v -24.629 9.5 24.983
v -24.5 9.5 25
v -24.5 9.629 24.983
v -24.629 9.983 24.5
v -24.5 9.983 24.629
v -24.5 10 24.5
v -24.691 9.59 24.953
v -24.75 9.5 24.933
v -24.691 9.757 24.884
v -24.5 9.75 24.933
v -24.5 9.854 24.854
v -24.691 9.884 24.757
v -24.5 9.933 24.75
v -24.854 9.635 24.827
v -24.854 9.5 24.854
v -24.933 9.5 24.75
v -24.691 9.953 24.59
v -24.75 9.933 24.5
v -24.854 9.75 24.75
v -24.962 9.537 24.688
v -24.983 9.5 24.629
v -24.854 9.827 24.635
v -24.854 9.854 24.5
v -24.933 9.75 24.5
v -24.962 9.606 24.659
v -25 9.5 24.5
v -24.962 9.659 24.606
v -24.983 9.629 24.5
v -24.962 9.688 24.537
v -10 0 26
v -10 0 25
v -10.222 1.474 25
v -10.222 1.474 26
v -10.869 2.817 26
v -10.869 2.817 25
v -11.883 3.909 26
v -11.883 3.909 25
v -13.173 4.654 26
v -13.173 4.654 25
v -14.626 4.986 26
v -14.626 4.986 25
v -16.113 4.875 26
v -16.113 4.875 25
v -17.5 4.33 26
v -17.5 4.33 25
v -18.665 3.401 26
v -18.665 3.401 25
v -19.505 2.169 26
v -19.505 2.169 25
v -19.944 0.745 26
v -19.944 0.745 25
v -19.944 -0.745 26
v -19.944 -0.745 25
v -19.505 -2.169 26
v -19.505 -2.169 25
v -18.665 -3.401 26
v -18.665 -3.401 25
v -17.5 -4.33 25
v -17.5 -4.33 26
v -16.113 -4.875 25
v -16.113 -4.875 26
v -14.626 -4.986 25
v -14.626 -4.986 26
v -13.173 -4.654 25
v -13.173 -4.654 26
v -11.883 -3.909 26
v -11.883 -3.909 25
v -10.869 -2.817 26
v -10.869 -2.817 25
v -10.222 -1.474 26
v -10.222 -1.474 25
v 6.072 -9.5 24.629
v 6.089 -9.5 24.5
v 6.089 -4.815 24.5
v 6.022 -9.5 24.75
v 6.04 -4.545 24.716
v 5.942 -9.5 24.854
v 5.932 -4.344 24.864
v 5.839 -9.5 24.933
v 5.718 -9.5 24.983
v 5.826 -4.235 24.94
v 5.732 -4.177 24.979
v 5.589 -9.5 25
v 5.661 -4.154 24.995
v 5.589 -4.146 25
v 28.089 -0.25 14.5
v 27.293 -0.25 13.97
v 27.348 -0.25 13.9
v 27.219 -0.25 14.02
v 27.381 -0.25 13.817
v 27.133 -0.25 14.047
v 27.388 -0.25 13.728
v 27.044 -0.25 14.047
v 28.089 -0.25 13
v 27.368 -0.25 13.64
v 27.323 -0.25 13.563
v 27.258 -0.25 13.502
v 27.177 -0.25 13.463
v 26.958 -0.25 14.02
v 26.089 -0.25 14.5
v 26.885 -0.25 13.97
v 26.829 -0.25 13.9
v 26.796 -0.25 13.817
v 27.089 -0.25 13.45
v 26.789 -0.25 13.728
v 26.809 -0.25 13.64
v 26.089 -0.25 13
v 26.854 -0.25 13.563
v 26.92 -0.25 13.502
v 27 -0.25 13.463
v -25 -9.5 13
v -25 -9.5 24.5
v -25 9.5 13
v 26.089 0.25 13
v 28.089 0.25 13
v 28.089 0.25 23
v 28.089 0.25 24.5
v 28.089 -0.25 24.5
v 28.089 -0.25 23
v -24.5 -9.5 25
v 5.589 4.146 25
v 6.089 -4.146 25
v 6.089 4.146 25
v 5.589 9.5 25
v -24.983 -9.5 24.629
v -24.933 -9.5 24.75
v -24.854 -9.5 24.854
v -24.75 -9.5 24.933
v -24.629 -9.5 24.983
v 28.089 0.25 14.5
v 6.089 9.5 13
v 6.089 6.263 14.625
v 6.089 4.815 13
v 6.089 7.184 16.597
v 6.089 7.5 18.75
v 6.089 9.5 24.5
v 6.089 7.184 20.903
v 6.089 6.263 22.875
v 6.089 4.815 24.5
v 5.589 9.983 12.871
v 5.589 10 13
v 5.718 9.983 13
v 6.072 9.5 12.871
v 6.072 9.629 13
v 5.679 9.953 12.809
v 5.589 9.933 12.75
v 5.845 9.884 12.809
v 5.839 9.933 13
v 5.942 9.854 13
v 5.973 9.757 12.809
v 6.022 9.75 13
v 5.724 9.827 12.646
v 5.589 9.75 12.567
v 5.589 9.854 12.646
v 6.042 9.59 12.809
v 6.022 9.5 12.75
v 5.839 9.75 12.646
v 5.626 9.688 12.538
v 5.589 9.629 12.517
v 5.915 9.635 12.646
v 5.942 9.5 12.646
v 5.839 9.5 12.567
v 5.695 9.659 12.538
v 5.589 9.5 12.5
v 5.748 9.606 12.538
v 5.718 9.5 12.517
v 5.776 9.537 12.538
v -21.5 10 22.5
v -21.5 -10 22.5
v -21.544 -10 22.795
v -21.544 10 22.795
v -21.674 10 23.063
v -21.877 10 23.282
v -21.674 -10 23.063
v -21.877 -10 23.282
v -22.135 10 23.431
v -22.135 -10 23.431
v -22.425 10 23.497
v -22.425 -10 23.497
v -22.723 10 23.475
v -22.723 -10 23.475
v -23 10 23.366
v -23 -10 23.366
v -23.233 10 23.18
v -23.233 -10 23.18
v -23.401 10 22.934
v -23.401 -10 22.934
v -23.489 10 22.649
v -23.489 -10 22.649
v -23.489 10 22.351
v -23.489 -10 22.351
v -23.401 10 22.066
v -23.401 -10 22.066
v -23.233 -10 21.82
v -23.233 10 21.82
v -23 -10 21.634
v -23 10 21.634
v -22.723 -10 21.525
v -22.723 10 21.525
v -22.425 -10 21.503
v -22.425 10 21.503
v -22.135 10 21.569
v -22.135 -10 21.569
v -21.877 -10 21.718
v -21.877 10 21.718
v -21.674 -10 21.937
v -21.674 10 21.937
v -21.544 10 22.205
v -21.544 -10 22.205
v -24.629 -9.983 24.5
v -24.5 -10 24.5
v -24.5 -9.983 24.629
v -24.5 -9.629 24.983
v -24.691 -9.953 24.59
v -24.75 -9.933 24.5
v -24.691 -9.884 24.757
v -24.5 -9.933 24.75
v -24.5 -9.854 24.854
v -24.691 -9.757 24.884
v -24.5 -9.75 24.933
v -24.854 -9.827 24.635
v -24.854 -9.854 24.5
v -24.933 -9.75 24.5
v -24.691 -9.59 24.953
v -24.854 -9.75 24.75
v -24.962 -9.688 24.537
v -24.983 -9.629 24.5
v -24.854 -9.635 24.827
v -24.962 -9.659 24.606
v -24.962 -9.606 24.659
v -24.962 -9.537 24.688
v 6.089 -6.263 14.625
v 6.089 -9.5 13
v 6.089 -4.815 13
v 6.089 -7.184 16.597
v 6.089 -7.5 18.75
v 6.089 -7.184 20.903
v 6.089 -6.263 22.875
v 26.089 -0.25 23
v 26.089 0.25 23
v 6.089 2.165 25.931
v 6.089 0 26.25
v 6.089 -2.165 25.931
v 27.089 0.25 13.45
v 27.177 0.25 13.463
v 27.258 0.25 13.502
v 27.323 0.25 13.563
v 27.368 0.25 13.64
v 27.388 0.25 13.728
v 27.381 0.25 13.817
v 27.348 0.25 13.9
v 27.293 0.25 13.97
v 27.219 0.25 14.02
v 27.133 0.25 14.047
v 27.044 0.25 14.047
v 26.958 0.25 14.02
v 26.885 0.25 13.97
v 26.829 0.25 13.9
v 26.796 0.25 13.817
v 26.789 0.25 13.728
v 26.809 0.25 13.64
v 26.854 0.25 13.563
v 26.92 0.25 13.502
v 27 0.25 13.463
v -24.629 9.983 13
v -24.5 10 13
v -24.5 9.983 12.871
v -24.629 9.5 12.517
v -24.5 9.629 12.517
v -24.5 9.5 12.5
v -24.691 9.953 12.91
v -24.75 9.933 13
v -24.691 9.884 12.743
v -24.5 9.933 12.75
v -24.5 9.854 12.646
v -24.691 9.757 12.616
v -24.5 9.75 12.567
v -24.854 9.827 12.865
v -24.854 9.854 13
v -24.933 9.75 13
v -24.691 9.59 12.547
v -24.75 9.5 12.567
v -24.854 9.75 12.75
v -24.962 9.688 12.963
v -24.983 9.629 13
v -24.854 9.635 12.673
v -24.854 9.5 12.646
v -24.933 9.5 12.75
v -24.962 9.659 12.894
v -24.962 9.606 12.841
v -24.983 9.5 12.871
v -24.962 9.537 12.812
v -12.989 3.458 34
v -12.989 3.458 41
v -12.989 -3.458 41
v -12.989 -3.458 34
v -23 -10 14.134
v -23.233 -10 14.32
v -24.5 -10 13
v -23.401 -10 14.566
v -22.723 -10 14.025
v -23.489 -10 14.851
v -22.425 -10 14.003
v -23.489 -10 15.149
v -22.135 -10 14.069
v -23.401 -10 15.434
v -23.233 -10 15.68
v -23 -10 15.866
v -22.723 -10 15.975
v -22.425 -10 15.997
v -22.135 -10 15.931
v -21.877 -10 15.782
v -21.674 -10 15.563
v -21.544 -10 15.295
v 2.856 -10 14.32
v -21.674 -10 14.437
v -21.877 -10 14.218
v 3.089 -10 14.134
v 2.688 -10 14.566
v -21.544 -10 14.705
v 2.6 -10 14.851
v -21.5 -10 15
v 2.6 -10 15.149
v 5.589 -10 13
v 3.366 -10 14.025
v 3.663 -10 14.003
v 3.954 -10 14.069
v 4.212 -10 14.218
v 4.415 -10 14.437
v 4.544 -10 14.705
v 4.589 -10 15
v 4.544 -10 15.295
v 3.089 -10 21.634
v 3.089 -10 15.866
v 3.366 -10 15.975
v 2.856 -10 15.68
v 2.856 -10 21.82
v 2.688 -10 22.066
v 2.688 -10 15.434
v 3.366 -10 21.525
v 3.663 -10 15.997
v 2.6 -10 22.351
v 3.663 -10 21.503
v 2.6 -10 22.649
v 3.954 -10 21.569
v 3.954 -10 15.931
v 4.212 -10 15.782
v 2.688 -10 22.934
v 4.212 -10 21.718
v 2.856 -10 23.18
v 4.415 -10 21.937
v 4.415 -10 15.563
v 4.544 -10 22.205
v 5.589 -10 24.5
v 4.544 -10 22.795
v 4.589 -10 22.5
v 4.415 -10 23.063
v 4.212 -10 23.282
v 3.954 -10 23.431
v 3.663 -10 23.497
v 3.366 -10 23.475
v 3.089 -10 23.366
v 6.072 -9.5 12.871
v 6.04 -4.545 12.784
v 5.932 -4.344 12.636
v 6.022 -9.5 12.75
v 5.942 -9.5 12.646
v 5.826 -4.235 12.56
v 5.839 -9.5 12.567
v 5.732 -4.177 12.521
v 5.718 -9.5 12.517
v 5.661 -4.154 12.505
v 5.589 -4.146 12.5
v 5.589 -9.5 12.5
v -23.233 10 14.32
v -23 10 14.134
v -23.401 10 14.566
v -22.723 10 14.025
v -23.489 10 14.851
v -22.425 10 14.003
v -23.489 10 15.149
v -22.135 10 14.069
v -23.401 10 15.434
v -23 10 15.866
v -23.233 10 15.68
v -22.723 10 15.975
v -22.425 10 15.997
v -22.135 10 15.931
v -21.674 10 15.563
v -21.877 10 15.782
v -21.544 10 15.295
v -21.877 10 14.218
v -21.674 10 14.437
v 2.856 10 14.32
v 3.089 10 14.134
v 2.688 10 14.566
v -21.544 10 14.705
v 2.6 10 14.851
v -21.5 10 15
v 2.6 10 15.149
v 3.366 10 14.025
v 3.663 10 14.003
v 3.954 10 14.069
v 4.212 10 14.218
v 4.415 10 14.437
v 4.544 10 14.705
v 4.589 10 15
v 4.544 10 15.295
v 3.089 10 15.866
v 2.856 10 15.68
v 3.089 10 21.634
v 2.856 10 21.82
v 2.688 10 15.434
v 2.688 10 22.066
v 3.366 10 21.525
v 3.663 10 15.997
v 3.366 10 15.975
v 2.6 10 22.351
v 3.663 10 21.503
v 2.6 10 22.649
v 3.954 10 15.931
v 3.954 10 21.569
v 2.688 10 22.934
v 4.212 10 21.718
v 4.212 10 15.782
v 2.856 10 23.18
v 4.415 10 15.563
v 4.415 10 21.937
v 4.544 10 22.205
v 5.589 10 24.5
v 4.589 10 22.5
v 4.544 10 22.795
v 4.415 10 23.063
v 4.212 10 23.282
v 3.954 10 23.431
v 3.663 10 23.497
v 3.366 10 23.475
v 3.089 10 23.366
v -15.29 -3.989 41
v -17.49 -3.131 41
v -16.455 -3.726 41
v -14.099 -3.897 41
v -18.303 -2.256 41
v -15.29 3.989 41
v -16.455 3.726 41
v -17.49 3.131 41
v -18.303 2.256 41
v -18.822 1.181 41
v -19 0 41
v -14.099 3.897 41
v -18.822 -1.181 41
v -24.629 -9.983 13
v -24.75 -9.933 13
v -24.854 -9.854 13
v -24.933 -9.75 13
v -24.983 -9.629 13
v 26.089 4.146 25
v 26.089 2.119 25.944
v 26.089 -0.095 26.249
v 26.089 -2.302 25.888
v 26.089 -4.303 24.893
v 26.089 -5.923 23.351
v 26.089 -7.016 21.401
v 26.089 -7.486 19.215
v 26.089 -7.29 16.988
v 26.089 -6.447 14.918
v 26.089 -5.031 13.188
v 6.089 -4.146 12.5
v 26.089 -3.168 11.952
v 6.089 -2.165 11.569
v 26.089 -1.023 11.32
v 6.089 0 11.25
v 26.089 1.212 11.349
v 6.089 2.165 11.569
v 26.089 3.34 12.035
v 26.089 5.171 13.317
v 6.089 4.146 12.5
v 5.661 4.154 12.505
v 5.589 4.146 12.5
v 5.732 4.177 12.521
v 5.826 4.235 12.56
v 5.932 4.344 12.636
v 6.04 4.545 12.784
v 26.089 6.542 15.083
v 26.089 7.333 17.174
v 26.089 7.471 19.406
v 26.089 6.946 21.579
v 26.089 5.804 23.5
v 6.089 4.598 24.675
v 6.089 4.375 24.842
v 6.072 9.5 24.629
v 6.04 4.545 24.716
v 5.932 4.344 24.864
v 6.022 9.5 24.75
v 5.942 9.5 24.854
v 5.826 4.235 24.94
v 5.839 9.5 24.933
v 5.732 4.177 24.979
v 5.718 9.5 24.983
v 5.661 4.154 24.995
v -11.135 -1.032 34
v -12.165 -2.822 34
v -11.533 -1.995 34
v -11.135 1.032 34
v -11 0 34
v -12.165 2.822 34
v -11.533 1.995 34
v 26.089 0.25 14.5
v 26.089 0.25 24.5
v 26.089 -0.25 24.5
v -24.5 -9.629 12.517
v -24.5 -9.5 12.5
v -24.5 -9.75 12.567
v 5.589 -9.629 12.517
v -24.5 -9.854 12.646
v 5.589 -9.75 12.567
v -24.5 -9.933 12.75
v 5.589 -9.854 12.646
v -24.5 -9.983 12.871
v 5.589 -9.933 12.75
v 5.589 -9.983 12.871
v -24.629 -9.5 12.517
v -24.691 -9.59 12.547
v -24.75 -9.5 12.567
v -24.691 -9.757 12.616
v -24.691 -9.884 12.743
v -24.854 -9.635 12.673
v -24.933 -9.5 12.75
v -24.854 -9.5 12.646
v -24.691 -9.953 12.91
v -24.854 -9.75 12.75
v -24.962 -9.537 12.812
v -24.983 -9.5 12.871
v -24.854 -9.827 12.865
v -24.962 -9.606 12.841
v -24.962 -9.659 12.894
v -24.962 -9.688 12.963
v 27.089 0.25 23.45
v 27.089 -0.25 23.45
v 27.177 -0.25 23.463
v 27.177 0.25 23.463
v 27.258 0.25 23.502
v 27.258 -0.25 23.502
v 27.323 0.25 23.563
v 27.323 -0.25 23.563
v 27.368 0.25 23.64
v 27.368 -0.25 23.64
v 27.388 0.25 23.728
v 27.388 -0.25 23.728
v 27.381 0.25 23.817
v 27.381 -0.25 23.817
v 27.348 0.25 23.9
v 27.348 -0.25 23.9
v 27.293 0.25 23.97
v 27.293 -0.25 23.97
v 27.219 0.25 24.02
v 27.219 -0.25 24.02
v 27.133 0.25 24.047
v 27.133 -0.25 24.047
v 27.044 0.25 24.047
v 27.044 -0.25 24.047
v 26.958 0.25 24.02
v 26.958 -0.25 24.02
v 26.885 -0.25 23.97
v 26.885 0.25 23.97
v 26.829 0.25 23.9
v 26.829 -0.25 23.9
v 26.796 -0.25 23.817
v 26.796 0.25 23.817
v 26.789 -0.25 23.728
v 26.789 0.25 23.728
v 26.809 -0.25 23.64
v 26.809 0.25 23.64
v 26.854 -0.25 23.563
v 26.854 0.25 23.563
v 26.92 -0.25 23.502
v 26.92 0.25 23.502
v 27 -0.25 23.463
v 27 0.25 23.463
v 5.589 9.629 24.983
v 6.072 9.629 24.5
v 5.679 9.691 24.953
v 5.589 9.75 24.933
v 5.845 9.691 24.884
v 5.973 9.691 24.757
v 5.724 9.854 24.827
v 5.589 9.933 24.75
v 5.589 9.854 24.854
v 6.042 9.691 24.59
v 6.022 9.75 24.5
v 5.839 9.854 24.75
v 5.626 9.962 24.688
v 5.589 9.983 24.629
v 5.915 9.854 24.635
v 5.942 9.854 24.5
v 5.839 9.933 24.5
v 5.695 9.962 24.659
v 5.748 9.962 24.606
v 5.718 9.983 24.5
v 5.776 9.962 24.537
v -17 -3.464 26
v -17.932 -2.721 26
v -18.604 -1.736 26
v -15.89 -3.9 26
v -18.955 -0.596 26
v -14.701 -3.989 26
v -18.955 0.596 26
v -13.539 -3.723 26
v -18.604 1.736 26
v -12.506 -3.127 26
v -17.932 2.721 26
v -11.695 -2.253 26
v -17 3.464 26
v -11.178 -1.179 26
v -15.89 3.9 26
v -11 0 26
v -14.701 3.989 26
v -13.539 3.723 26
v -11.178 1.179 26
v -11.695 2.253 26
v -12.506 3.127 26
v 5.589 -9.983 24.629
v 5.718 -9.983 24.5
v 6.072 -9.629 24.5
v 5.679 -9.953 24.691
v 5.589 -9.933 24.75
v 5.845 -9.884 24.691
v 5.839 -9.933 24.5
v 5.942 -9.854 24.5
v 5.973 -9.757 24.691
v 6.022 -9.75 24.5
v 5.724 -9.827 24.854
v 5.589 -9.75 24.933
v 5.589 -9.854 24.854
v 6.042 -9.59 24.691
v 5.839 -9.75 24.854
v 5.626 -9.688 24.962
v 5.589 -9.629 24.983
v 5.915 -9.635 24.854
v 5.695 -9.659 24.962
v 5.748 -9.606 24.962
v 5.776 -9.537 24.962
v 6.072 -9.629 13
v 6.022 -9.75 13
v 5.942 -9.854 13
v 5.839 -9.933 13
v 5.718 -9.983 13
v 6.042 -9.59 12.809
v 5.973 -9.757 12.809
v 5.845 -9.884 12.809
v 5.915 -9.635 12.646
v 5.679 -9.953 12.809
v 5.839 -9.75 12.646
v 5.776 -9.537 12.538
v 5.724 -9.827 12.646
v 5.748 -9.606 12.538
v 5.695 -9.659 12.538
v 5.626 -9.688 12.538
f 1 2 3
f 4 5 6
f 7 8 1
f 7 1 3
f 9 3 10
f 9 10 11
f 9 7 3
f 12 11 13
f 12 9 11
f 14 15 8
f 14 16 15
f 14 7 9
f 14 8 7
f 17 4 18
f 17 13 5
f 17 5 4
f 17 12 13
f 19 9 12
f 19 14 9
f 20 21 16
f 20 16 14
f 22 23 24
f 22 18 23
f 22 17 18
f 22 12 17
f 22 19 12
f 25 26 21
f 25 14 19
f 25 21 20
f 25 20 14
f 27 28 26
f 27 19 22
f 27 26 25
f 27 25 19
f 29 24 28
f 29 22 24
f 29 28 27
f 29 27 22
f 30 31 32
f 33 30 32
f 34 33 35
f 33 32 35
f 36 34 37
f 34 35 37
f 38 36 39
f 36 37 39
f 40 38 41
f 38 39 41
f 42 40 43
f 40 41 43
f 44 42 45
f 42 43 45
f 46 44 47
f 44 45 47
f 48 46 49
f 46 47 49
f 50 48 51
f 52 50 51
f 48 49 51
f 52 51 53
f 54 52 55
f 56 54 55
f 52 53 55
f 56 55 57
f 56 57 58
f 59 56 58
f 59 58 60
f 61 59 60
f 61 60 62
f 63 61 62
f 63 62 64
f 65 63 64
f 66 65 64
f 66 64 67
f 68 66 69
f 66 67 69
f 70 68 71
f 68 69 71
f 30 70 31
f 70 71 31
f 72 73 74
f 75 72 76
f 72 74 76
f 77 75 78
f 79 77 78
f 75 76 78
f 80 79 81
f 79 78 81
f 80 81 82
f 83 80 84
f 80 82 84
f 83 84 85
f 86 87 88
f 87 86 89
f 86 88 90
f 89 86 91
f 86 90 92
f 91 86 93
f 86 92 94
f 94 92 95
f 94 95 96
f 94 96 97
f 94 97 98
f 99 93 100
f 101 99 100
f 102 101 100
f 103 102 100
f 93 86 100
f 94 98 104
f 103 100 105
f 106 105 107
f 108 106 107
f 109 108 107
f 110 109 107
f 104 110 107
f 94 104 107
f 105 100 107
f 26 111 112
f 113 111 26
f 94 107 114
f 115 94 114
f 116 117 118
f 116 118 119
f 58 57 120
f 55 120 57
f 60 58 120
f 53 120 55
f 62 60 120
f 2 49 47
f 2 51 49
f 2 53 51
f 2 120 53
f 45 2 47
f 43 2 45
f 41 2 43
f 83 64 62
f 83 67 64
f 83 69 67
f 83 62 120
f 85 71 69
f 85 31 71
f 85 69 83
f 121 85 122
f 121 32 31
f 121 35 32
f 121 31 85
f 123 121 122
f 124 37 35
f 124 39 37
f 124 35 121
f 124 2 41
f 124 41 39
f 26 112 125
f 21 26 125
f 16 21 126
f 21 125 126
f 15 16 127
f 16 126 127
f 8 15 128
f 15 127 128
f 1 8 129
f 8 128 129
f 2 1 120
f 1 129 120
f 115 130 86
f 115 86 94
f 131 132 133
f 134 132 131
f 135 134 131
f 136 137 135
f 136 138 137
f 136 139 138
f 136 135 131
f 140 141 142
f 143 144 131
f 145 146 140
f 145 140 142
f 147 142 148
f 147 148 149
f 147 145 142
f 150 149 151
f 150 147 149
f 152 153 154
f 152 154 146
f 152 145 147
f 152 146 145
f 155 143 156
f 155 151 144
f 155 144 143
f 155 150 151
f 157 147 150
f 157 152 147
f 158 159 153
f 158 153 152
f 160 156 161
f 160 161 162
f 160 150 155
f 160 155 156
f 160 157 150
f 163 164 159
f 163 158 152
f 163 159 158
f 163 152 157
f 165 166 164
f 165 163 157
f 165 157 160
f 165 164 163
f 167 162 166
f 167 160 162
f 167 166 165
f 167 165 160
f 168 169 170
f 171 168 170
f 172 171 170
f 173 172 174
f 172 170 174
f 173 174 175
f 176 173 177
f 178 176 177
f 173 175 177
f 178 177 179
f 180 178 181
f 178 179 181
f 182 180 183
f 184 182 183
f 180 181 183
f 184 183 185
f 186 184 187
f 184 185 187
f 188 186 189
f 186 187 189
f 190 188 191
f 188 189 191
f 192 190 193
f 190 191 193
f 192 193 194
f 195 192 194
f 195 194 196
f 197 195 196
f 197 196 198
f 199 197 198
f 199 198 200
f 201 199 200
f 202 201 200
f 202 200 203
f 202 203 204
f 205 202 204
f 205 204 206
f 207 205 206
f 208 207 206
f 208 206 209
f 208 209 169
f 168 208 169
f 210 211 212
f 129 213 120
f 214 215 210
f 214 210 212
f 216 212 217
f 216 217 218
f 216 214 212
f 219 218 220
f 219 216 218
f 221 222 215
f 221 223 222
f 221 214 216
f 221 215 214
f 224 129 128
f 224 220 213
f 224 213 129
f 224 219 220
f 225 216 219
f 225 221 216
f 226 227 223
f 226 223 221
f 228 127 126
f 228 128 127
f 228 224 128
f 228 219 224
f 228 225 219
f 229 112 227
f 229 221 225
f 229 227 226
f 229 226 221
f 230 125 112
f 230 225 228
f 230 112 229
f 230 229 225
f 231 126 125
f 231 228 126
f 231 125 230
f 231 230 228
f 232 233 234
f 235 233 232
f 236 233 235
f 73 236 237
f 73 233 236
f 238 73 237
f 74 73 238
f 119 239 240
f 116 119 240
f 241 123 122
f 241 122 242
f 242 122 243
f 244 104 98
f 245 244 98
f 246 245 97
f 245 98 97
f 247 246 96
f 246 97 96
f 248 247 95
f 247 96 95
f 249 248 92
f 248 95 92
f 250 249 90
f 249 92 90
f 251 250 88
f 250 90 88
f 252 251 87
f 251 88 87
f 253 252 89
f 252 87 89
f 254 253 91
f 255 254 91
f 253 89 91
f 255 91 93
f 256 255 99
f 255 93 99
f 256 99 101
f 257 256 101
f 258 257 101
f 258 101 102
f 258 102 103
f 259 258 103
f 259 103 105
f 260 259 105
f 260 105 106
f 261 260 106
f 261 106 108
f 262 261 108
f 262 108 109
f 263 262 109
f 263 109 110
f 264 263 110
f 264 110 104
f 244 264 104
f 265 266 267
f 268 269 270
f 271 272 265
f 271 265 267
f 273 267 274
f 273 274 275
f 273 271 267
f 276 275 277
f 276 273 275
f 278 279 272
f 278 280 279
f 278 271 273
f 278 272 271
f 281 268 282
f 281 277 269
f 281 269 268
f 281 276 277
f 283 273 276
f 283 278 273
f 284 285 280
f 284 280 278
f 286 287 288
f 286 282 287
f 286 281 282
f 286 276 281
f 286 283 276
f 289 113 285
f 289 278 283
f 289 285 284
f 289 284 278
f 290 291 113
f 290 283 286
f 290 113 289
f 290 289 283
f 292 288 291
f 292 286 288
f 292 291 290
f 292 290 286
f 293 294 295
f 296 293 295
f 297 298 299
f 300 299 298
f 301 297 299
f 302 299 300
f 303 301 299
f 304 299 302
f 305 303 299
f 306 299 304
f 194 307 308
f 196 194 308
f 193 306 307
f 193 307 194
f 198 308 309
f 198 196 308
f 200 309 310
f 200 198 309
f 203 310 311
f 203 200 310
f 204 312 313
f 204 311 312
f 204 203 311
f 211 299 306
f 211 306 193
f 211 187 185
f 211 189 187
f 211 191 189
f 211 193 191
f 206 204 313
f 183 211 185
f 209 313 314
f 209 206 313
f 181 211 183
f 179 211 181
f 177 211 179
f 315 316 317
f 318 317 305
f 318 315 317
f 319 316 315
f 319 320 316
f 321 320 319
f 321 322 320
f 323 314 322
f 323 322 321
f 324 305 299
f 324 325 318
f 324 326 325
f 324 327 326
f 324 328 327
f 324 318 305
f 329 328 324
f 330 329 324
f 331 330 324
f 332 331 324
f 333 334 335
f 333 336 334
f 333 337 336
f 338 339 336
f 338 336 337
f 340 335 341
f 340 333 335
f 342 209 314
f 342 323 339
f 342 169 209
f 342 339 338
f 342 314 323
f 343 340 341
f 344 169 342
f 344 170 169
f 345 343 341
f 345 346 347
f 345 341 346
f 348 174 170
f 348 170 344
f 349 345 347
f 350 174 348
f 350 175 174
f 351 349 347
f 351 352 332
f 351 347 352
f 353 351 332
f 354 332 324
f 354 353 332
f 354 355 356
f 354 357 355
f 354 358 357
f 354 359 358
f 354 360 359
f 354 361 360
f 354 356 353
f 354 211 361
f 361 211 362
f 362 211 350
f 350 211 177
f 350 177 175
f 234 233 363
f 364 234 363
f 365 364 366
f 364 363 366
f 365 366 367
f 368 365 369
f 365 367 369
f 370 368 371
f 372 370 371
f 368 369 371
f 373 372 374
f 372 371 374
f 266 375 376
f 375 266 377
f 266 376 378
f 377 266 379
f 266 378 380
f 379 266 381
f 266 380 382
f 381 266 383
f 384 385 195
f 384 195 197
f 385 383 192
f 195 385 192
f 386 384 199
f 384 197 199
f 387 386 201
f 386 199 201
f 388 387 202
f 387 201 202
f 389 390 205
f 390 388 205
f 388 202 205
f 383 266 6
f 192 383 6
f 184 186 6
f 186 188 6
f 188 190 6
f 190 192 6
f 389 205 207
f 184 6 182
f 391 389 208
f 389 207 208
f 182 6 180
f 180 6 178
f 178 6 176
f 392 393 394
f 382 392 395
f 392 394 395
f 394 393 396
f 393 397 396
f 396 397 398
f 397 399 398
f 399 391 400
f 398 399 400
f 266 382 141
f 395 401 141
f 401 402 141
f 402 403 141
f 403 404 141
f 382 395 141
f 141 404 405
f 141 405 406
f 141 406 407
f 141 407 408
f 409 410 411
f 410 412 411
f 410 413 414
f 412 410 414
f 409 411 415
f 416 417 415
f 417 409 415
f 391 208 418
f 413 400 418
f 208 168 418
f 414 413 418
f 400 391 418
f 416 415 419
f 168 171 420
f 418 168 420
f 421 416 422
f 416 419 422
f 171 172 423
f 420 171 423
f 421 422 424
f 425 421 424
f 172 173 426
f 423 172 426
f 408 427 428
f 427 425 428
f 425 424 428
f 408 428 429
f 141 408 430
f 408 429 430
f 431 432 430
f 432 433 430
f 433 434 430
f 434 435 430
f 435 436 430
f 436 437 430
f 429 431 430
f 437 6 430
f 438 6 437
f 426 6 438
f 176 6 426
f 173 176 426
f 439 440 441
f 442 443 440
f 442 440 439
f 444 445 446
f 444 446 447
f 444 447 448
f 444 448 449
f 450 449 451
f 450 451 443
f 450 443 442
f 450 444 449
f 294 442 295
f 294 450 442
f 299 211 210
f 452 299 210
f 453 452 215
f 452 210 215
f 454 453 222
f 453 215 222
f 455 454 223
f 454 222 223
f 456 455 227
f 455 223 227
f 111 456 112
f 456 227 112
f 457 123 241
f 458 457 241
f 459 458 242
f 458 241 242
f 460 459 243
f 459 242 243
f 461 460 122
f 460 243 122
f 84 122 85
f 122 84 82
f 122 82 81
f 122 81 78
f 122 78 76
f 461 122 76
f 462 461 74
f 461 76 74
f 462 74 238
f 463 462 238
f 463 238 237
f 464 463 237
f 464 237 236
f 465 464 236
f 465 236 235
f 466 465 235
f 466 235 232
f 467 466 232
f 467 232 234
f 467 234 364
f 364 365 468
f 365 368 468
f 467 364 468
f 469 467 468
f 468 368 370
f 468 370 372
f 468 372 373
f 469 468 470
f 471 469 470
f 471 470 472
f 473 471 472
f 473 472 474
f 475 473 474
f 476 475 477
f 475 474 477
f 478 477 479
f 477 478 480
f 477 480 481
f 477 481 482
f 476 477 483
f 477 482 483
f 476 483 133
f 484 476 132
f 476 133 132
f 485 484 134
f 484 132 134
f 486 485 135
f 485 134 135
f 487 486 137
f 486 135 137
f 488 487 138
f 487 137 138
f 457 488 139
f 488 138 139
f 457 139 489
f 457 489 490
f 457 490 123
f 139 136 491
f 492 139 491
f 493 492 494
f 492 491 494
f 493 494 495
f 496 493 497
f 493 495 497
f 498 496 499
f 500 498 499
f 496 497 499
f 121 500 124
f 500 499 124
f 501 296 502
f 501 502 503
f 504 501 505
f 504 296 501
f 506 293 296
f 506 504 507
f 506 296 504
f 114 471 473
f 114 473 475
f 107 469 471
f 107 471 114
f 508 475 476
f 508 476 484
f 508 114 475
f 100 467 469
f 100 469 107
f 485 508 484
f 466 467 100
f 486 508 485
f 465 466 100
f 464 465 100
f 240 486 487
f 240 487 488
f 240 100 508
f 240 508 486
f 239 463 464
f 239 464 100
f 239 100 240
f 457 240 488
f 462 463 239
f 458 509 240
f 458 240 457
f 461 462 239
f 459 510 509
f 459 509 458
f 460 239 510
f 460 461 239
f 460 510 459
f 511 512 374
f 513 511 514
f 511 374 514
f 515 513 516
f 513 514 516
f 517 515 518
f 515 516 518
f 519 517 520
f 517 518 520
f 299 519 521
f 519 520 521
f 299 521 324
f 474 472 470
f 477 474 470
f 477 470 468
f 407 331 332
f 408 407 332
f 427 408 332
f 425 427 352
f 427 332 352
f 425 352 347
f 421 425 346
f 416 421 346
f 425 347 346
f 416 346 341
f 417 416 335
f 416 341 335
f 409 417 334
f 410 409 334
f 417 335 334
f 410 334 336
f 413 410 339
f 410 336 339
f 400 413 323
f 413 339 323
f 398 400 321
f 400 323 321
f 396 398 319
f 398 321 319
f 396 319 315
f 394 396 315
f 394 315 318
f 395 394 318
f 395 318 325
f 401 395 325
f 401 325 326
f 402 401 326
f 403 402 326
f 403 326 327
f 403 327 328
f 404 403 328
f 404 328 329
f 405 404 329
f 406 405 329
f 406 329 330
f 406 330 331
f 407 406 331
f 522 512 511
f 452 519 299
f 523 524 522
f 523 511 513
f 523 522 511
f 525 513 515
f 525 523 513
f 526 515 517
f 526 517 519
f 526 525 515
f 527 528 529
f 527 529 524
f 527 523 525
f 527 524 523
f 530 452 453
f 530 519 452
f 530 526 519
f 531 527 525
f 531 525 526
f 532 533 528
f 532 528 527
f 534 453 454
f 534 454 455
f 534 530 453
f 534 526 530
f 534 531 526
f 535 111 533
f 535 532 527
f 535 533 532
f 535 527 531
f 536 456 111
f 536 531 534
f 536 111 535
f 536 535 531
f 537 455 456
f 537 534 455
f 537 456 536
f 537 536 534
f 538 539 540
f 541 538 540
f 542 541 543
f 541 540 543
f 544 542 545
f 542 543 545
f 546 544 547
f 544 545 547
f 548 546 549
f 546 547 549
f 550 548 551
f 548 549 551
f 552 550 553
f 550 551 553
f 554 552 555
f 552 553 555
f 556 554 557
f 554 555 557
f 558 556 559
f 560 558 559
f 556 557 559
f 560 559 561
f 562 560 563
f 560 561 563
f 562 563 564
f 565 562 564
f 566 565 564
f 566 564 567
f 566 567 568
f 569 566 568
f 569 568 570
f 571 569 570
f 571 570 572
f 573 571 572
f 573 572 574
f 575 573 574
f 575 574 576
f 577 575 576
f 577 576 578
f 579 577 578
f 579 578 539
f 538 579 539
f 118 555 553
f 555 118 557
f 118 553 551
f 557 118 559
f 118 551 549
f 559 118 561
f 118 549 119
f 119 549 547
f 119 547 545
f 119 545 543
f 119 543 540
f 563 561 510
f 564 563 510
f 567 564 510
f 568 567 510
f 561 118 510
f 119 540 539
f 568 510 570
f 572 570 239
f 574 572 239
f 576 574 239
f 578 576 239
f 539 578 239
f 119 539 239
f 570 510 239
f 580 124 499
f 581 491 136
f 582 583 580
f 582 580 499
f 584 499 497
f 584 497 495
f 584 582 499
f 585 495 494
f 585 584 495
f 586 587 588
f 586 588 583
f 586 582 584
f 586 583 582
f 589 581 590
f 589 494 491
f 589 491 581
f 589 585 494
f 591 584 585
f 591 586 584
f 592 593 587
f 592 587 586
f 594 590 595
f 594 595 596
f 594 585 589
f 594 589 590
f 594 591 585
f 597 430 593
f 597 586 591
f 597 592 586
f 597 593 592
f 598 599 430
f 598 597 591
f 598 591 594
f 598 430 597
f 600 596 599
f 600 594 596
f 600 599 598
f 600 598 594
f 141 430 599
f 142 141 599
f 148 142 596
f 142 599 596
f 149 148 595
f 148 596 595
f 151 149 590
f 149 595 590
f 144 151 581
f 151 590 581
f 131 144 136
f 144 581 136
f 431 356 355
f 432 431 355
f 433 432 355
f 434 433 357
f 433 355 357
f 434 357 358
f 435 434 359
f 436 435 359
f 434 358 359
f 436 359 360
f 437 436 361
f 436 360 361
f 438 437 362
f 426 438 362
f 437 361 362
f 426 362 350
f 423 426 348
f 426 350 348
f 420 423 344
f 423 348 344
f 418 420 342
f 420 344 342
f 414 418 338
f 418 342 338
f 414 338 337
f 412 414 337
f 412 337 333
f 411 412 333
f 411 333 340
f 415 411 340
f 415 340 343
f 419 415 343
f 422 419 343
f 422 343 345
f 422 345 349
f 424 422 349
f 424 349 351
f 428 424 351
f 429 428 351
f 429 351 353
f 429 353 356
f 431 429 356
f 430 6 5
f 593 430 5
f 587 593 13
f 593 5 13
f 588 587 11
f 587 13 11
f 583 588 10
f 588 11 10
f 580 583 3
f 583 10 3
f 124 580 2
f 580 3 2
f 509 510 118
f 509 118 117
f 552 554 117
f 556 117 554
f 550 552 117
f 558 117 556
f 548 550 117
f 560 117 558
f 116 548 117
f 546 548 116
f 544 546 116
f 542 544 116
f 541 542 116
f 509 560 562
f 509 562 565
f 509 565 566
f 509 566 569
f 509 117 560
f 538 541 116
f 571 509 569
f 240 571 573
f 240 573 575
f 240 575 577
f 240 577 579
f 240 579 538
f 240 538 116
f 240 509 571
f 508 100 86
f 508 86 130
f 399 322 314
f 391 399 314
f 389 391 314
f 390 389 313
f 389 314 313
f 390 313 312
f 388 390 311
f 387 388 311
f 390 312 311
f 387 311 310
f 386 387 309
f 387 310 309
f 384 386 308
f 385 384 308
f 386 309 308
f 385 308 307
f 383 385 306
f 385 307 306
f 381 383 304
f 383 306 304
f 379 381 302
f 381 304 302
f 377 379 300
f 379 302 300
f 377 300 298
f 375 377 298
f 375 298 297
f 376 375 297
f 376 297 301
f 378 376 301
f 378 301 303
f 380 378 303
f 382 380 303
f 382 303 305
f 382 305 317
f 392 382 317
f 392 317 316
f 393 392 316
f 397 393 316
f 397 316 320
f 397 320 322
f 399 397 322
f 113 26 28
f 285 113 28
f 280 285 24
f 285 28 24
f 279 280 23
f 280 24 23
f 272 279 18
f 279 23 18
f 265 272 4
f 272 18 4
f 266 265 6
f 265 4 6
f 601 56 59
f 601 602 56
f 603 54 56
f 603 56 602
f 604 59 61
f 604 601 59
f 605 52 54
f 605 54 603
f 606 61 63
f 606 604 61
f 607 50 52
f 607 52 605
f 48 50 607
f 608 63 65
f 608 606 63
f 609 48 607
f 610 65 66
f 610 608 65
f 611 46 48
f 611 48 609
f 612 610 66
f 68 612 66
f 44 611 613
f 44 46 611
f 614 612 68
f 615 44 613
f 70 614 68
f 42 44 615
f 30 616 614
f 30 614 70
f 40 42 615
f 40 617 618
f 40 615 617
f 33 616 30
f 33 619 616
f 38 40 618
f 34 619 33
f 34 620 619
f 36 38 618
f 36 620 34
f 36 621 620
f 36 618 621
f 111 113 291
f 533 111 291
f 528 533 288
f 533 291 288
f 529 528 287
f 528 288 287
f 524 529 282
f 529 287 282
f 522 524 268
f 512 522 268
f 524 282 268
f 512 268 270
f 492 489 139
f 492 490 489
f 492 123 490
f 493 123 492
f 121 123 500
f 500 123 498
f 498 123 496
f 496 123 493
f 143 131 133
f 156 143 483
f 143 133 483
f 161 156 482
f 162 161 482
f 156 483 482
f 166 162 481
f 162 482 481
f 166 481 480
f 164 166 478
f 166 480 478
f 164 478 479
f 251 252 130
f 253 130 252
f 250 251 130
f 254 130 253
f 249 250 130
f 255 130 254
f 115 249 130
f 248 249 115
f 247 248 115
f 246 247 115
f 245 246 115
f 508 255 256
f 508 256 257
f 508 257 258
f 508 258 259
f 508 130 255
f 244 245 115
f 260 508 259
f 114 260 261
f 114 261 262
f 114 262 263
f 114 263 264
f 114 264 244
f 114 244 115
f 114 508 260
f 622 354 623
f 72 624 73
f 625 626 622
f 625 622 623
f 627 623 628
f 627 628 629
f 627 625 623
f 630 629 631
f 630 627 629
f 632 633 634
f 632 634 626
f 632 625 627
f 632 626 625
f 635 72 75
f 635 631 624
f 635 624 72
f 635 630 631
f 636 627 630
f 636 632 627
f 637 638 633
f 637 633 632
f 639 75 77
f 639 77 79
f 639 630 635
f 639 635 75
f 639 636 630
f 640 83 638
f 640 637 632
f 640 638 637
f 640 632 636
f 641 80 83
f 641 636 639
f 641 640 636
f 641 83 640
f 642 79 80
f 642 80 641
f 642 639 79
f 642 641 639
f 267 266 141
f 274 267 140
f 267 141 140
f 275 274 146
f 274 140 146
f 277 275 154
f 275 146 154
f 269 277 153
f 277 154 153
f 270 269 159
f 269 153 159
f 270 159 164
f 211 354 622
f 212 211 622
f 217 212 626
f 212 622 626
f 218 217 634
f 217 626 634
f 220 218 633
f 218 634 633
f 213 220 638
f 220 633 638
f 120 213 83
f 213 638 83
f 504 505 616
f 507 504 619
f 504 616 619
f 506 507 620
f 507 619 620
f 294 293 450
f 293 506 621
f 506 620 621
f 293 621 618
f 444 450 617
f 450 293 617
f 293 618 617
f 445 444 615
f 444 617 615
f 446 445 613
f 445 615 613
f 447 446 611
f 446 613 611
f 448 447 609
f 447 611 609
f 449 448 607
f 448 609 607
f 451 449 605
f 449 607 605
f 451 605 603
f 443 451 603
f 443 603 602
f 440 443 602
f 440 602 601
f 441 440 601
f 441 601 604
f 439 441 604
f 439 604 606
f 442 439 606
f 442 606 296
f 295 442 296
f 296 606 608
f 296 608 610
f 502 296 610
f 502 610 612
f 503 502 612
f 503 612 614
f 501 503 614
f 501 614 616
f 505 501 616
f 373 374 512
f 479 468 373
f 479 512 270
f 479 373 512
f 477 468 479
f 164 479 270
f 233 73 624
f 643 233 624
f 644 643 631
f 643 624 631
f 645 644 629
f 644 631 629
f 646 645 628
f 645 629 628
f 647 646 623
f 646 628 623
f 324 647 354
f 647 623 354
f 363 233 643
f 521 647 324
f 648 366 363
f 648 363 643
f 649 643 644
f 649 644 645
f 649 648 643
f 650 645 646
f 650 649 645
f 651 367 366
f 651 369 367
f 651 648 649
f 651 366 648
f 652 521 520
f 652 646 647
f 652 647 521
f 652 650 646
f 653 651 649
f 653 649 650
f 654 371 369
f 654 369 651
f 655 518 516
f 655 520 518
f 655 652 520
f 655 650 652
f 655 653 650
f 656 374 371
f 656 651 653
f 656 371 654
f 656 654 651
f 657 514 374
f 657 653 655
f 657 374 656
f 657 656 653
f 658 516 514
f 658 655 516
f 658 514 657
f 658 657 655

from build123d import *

# Parameters (mm, degrees)
SKETCH_1_W          = 50
SKETCH_1_H          = 30
EXTRUDE_1_DEPTH     = 25
SKETCH_2_R          = 5
EXTRUDE_2_DEPTH     = 1
SKETCH_3_R          = 4
EXTRUDE_3_DEPTH     = 15
SKETCH_6_W          = 125.650571392
SKETCH_6_H          = 76.942116616
SKETCH_6_W_2        = 31.088556847
SKETCH_6_H_2        = 20
CUT_EXTRUDE_1_DEPTH = 39.405728739
SKETCH_7_W          = 12.5
SKETCH_7_H          = 20
CUT_EXTRUDE_2_DEPTH = 53.416584845
SKETCH_8_R          = 7.5
EXTRUDE_5_DEPTH     = 20
SKETCH_9_W          = 1.5
SKETCH_9_H          = 0.5
EXTRUDE_6_DEPTH     = 2
SKETCH_10_R         = 0.3
CUT_EXTRUDE_3_DEPTH = 2
FILLET_1_R          = 0.5
CUT_EXTRUDE_START   = -7
CUT_EXTRUDE_4_DEPTH = 7
SKETCH_12_R         = 1
CUT_EXTRUDE_5_DEPTH = 54.572073189


with BuildPart() as part:
    # 草图1 → 凸台-拉伸1 (new body)
    with BuildSketch(Plane.XY):
        Rectangle(SKETCH_1_W, SKETCH_1_H)
    extrude(amount=EXTRUDE_1_DEPTH)

    # 草图2 → 凸台-拉伸2 (add)
    with BuildSketch(Plane.XY.offset(25)):
        with Locations((-15, 0)):
            Circle(SKETCH_2_R)
    extrude(amount=EXTRUDE_2_DEPTH)

    # 草图3 → 凸台-拉伸3 (add)
    with BuildSketch(Plane.XY.offset(26)):
        with Locations((-15, 0)):
            Circle(SKETCH_3_R)
    extrude(amount=EXTRUDE_3_DEPTH)

    # 草图6 → 切除-拉伸1 (cut, through all)
    with BuildSketch(Plane.XY.offset(25)):
        with Locations((-32.975192835, 18.238730024)):
            Rectangle(SKETCH_6_W, SKETCH_6_H)
        with Locations((-9.455721577, 0)):
            Rectangle(SKETCH_6_W_2, SKETCH_6_H_2, mode=Mode.SUBTRACT)
    extrude(amount=-CUT_EXTRUDE_1_DEPTH, mode=Mode.SUBTRACT)

    # 草图7 → 切除-拉伸2 (cut, through all)
    with BuildSketch(Plane(origin=(6.088556847, 0, 0), x_dir=(0, 0, -1), z_dir=(1, 0, 0))):
        with Locations((-6.25, 0)):
            Rectangle(SKETCH_7_W, SKETCH_7_H)
    extrude(amount=-CUT_EXTRUDE_2_DEPTH, mode=Mode.SUBTRACT)

    # 草图8 → 凸台-拉伸5 (add)
    with BuildSketch(Plane(origin=(6.088556847, 0, 0), x_dir=(0, 0, -1), z_dir=(1, 0, 0))):
        with Locations(Location((-18.75, 0, 0), (0, 0, 146.442690238))):
            Circle(SKETCH_8_R)
    extrude(amount=EXTRUDE_5_DEPTH)

    # 草图9 → 凸台-拉伸6 (add)
    with BuildSketch(Plane(origin=(26.088556847, 0, 0), x_dir=(0, 0, -1), z_dir=(1, 0, 0))):
        with Locations((-23.75, 0)):
            Rectangle(SKETCH_9_W, SKETCH_9_H)
        with Locations((-13.75, 0)):
            Rectangle(SKETCH_9_W, SKETCH_9_H)
    extrude(amount=EXTRUDE_6_DEPTH)

    # 草图10 → 切除-拉伸3 (cut)
    with BuildSketch(Plane.XZ.offset(0.25)):
        with Locations(Location((27.088556847, 23.75, 0), (0, 0, 270))):
            Circle(SKETCH_10_R)
        with Locations(Location((27.088556847, 13.75, 0), (0, 0, 270))):
            Circle(SKETCH_10_R)
    extrude(amount=-CUT_EXTRUDE_3_DEPTH, mode=Mode.SUBTRACT)

    # 圆角1
    # the kernel refuses this fillet: 0.5 mm, written as the material it takes off along each edge
    with BuildSketch(Plane(origin=(-24.5, -9.5, 24.5), x_dir=(0, 0, 1), z_dir=(-1, 0, 0))) as fillet_1_piece_1_section:
        Polygon((0, 0), (FILLET_1_R * 1.02, 0), (FILLET_1_R * 1.02, -FILLET_1_R * 1.02), (0, -FILLET_1_R * 1.02), align=None)
    fillet_1_piece_1 = extrude(amount=FILLET_1_R * 1.02, mode=Mode.PRIVATE)
    fillet_1_piece_1 = fillet_1_piece_1 - Plane(origin=(-24.5, -9.5, 24.5), x_dir=(0, 0.7071067811865475, -0.7071067811865475), z_dir=(-1, 0, 0)) * Sphere(FILLET_1_R, mode=Mode.PRIVATE)
    add(fillet_1_piece_1, mode=Mode.SUBTRACT)
    with BuildSketch(Plane(origin=(-24.5, 9.5, 24.5), x_dir=(0, 1, 0), z_dir=(-1, 0, 0))) as fillet_1_piece_2_section:
        Polygon((0, 0), (FILLET_1_R * 1.02, 0), (FILLET_1_R * 1.02, -FILLET_1_R * 1.02), (0, -FILLET_1_R * 1.02), align=None)
    fillet_1_piece_2 = extrude(amount=FILLET_1_R * 1.02, mode=Mode.PRIVATE)
    fillet_1_piece_2 = fillet_1_piece_2 - Plane(origin=(-24.5, 9.5, 24.5), x_dir=(0, -0.7071067811865475, -0.7071067811865475), z_dir=(-1, 0, 0)) * Sphere(FILLET_1_R, mode=Mode.PRIVATE)
    add(fillet_1_piece_2, mode=Mode.SUBTRACT)
    with BuildSketch(Plane(origin=(5.588556847, 9.5, 24.5), x_dir=(0, 0, 1), z_dir=(0, 1, 0))) as fillet_1_piece_3_section:
        Polygon((0, 0), (FILLET_1_R * 1.02, 0), (FILLET_1_R * 1.02, FILLET_1_R * 1.02), (0, FILLET_1_R * 1.02), align=None)
    fillet_1_piece_3 = extrude(amount=FILLET_1_R * 1.02, mode=Mode.PRIVATE)
    fillet_1_piece_3 = fillet_1_piece_3 - Plane(origin=(5.588556847, 9.5, 24.5), x_dir=(-0.7071067811865475, 0, -0.7071067811865475), z_dir=(0, 1, 0)) * Sphere(FILLET_1_R, mode=Mode.PRIVATE)
    add(fillet_1_piece_3, mode=Mode.SUBTRACT)
    with BuildSketch(Plane(origin=(5.588556847, -9.5, 24.5), x_dir=(0, -1, 0), z_dir=(0, 0, 1))) as fillet_1_piece_4_section:
        Polygon((0, 0), (FILLET_1_R * 1.02, 0), (FILLET_1_R * 1.02, FILLET_1_R * 1.02), (0, FILLET_1_R * 1.02), align=None)
    fillet_1_piece_4 = extrude(amount=FILLET_1_R * 1.02, mode=Mode.PRIVATE)
    fillet_1_piece_4 = fillet_1_piece_4 - Plane(origin=(5.588556847, -9.5, 24.5), x_dir=(-0.7071067811865475, 0.7071067811865476, 0), z_dir=(0, 0, 1)) * Sphere(FILLET_1_R, mode=Mode.PRIVATE)
    add(fillet_1_piece_4, mode=Mode.SUBTRACT)
    with BuildSketch(Plane(origin=(-24.5, -9.5, 13), x_dir=(0, 0, -1), z_dir=(-1, 0, 0))) as fillet_1_piece_5_section:
        Polygon((0, 0), (FILLET_1_R * 1.02, 0), (FILLET_1_R * 1.02, FILLET_1_R * 1.02), (0, FILLET_1_R * 1.02), align=None)
    fillet_1_piece_5 = extrude(amount=FILLET_1_R * 1.02, mode=Mode.PRIVATE)
    fillet_1_piece_5 = fillet_1_piece_5 - Plane(origin=(-24.5, -9.5, 13), x_dir=(0, 0.7071067811865475, 0.7071067811865475), z_dir=(-1, 0, 0)) * Sphere(FILLET_1_R, mode=Mode.PRIVATE)
    add(fillet_1_piece_5, mode=Mode.SUBTRACT)
    with BuildSketch(Plane(origin=(5.588556847, -9.5, 13), x_dir=(0, -1, 0), z_dir=(0, 0, -1))) as fillet_1_piece_6_section:
        Polygon((0, 0), (FILLET_1_R * 1.02, 0), (FILLET_1_R * 1.02, -FILLET_1_R * 1.02), (0, -FILLET_1_R * 1.02), align=None)
    fillet_1_piece_6 = extrude(amount=FILLET_1_R * 1.02, mode=Mode.PRIVATE)
    fillet_1_piece_6 = fillet_1_piece_6 - Plane(origin=(5.588556847, -9.5, 13), x_dir=(-0.7071067811865475, 0.7071067811865476, 0), z_dir=(0, 0, -1)) * Sphere(FILLET_1_R, mode=Mode.PRIVATE)
    add(fillet_1_piece_6, mode=Mode.SUBTRACT)
    with BuildSketch(Plane(origin=(5.588556847, 9.5, 13), x_dir=(0, 1, 0), z_dir=(0, 0, -1))) as fillet_1_piece_7_section:
        Polygon((0, 0), (FILLET_1_R * 1.02, 0), (FILLET_1_R * 1.02, FILLET_1_R * 1.02), (0, FILLET_1_R * 1.02), align=None)
    fillet_1_piece_7 = extrude(amount=FILLET_1_R * 1.02, mode=Mode.PRIVATE)
    fillet_1_piece_7 = fillet_1_piece_7 - Plane(origin=(5.588556847, 9.5, 13), x_dir=(-0.7071067811865475, -0.7071067811865476, 0), z_dir=(0, 0, -1)) * Sphere(FILLET_1_R, mode=Mode.PRIVATE)
    add(fillet_1_piece_7, mode=Mode.SUBTRACT)
    with BuildSketch(Plane(origin=(-24.5, 9.5, 13), x_dir=(0, 0, -1), z_dir=(-1, 0, 0))) as fillet_1_piece_8_section:
        Polygon((0, 0), (FILLET_1_R * 1.02, 0), (FILLET_1_R * 1.02, -FILLET_1_R * 1.02), (0, -FILLET_1_R * 1.02), align=None)
    fillet_1_piece_8 = extrude(amount=FILLET_1_R * 1.02, mode=Mode.PRIVATE)
    fillet_1_piece_8 = fillet_1_piece_8 - Plane(origin=(-24.5, 9.5, 13), x_dir=(0, -0.7071067811865475, 0.7071067811865475), z_dir=(-1, 0, 0)) * Sphere(FILLET_1_R, mode=Mode.PRIVATE)
    add(fillet_1_piece_8, mode=Mode.SUBTRACT)
    with BuildSketch(Plane(origin=(-25, -9.5, 25), x_dir=(0, 0, -1), z_dir=(0, 1, 0)), Plane(origin=(-25, 9.5, 12.5), x_dir=(0, 0, 1), z_dir=(0, -1, 0))) as fillet_1_piece_9:
        with BuildLine():
            CenterArc((FILLET_1_R, -FILLET_1_R), FILLET_1_R, 90, 90)
            Line((0, -FILLET_1_R), (0, 0))
            Line((0, 0), (FILLET_1_R, 0))
        make_face()
    extrude(amount=19, mode=Mode.SUBTRACT)
    with BuildSketch(Plane(origin=(-24.5, 10, 25), x_dir=(0, 0, -1), z_dir=(1, 0, 0)), Plane(origin=(5.588556847, -10, 12.5), x_dir=(0, 1, 0), z_dir=(-1, 0, 0))) as fillet_1_piece_10:
        with BuildLine():
            CenterArc((FILLET_1_R, -FILLET_1_R), FILLET_1_R, 90, 90)
            Line((0, -FILLET_1_R), (0, 0))
            Line((0, 0), (FILLET_1_R, 0))
        make_face()
    extrude(amount=30.088556847, mode=Mode.SUBTRACT)
    with BuildSketch(Plane(origin=(6.088556847, -2.895780988, 25), x_dir=(-1, 0, 0), z_dir=(0, -1, 0))) as fillet_1_piece_11_section:
        with BuildLine():
            CenterArc((FILLET_1_R, FILLET_1_R), FILLET_1_R, 180, 90)
            Line((0, FILLET_1_R), (0, 0))
            Line((0, 0), (FILLET_1_R, 0))
        make_face()
    fillet_1_piece_11 = extrude(amount=6.604219012, mode=Mode.PRIVATE)
    fillet_1_piece_11 = fillet_1_piece_11 - Plane(origin=(5.975472157, 0, 18.75), x_dir=(0, 0.5527707983937196, 0.8333333333325685), z_dir=(-1, 0, 0)) * Cylinder(7.5, 16, mode=Mode.PRIVATE)
    add(fillet_1_piece_11, mode=Mode.SUBTRACT)
    with BuildSketch(Plane(origin=(5.588556847, -10, 25), x_dir=(0, 1, 0), z_dir=(-1, 0, 0)), Plane(origin=(5.588556847, 10, 12.5), x_dir=(0, -1, 0), z_dir=(-1, 0, 0))) as fillet_1_piece_12:
        with BuildLine():
            CenterArc((FILLET_1_R, FILLET_1_R), FILLET_1_R, 180, 90)
            Line((0, FILLET_1_R), (0, 0))
            Line((0, 0), (FILLET_1_R, 0))
        make_face()
    extrude(amount=30.088556847, mode=Mode.SUBTRACT)
    with BuildSketch(Plane(origin=(-25, -10, 24.5), x_dir=(0, 1, 0), z_dir=(0, 0, -1)), Plane(origin=(6.088556847, -10, 24.5), x_dir=(-1, 0, 0), z_dir=(0, 0, -1))) as fillet_1_piece_13:
        with BuildLine():
            CenterArc((FILLET_1_R, FILLET_1_R), FILLET_1_R, 180, 90)
            Line((0, FILLET_1_R), (0, 0))
            Line((0, 0), (FILLET_1_R, 0))
        make_face()
    extrude(amount=11.5, mode=Mode.SUBTRACT)
    with BuildSketch(Plane(origin=(6.088556847, 10, 24.5), x_dir=(-1, 0, 0), z_dir=(0, 0, -1)), Plane(origin=(-25, 10, 24.5), x_dir=(0, -1, 0), z_dir=(0, 0, -1))) as fillet_1_piece_14:
        with BuildLine():
            CenterArc((FILLET_1_R, -FILLET_1_R), FILLET_1_R, 90, 90)
            Line((0, -FILLET_1_R), (0, 0))
            Line((0, 0), (FILLET_1_R, 0))
        make_face()
    extrude(amount=11.5, mode=Mode.SUBTRACT)
    with BuildSketch(Plane(origin=(6.088556847, 2.895780988, 12.5), x_dir=(-1, 0, 0), z_dir=(0, 1, 0))) as fillet_1_piece_15_section:
        with BuildLine():
            CenterArc((FILLET_1_R, FILLET_1_R), FILLET_1_R, 180, 90)
            Line((0, FILLET_1_R), (0, 0))
            Line((0, 0), (FILLET_1_R, 0))
        make_face()
    fillet_1_piece_15 = extrude(amount=6.604219012, mode=Mode.PRIVATE)
    fillet_1_piece_15 = fillet_1_piece_15 - Plane(origin=(5.975472139, 0, 18.75), x_dir=(0, 0.5527707983937196, 0.8333333333325685), z_dir=(-1, 0, 0)) * Cylinder(7.5, 16, mode=Mode.PRIVATE)
    add(fillet_1_piece_15, mode=Mode.SUBTRACT)
    with BuildSketch(Plane(origin=(6.088556847, -9.5, 12.5), x_dir=(-1, 0, 0), z_dir=(0, 1, 0))) as fillet_1_piece_16_section:
        with BuildLine():
            CenterArc((FILLET_1_R, FILLET_1_R), FILLET_1_R, 180, 90)
            Line((0, FILLET_1_R), (0, 0))
            Line((0, 0), (FILLET_1_R, 0))
        make_face()
    fillet_1_piece_16 = extrude(amount=6.604219012, mode=Mode.PRIVATE)
    fillet_1_piece_16 = fillet_1_piece_16 - Plane(origin=(5.97547253, 0, 18.75), x_dir=(0, 0.5527707983937196, 0.8333333333325685), z_dir=(-1, 0, 0)) * Cylinder(7.5, 16, mode=Mode.PRIVATE)
    add(fillet_1_piece_16, mode=Mode.SUBTRACT)
    with BuildSketch(Plane(origin=(6.088556847, 9.5, 25), x_dir=(-1, 0, 0), z_dir=(0, -1, 0))) as fillet_1_piece_17_section:
        with BuildLine():
            CenterArc((FILLET_1_R, FILLET_1_R), FILLET_1_R, 180, 90)
            Line((0, FILLET_1_R), (0, 0))
            Line((0, 0), (FILLET_1_R, 0))
        make_face()
    fillet_1_piece_17 = extrude(amount=6.604219012, mode=Mode.PRIVATE)
    fillet_1_piece_17 = fillet_1_piece_17 - Plane(origin=(5.975472488, 0, 18.75), x_dir=(0, 0.5527707983937196, 0.8333333333325685), z_dir=(-1, 0, 0)) * Cylinder(7.5, 16, mode=Mode.PRIVATE)
    add(fillet_1_piece_17, mode=Mode.SUBTRACT)

    # 草图11 → 切除-拉伸4 (cut)
    with BuildSketch(Plane.XY.offset(41).offset(CUT_EXTRUDE_START)):
        with BuildLine():
            Line((-12.989168341, 3.457825334), (-12.989168341, -3.457825334))
            ThreePointArc((-12.989168341, -3.457825334), (-11, 0), (-12.989168341, 3.457825334))
        make_face()
    extrude(amount=CUT_EXTRUDE_4_DEPTH, mode=Mode.SUBTRACT)

    # 草图12 → 切除-拉伸5 (cut, through all)
    with BuildSketch(Plane.XZ.offset(10)):
        with Locations((-22.5, 22.5)):
            Circle(SKETCH_12_R)
        with Locations((3.588556847, 22.5)):
            Circle(SKETCH_12_R)
        with Locations((-22.5, 15)):
            Circle(SKETCH_12_R)
        with Locations((3.588556847, 15)):
            Circle(SKETCH_12_R)
    extrude(amount=-CUT_EXTRUDE_5_DEPTH, mode=Mode.SUBTRACT)


solid = part.part
